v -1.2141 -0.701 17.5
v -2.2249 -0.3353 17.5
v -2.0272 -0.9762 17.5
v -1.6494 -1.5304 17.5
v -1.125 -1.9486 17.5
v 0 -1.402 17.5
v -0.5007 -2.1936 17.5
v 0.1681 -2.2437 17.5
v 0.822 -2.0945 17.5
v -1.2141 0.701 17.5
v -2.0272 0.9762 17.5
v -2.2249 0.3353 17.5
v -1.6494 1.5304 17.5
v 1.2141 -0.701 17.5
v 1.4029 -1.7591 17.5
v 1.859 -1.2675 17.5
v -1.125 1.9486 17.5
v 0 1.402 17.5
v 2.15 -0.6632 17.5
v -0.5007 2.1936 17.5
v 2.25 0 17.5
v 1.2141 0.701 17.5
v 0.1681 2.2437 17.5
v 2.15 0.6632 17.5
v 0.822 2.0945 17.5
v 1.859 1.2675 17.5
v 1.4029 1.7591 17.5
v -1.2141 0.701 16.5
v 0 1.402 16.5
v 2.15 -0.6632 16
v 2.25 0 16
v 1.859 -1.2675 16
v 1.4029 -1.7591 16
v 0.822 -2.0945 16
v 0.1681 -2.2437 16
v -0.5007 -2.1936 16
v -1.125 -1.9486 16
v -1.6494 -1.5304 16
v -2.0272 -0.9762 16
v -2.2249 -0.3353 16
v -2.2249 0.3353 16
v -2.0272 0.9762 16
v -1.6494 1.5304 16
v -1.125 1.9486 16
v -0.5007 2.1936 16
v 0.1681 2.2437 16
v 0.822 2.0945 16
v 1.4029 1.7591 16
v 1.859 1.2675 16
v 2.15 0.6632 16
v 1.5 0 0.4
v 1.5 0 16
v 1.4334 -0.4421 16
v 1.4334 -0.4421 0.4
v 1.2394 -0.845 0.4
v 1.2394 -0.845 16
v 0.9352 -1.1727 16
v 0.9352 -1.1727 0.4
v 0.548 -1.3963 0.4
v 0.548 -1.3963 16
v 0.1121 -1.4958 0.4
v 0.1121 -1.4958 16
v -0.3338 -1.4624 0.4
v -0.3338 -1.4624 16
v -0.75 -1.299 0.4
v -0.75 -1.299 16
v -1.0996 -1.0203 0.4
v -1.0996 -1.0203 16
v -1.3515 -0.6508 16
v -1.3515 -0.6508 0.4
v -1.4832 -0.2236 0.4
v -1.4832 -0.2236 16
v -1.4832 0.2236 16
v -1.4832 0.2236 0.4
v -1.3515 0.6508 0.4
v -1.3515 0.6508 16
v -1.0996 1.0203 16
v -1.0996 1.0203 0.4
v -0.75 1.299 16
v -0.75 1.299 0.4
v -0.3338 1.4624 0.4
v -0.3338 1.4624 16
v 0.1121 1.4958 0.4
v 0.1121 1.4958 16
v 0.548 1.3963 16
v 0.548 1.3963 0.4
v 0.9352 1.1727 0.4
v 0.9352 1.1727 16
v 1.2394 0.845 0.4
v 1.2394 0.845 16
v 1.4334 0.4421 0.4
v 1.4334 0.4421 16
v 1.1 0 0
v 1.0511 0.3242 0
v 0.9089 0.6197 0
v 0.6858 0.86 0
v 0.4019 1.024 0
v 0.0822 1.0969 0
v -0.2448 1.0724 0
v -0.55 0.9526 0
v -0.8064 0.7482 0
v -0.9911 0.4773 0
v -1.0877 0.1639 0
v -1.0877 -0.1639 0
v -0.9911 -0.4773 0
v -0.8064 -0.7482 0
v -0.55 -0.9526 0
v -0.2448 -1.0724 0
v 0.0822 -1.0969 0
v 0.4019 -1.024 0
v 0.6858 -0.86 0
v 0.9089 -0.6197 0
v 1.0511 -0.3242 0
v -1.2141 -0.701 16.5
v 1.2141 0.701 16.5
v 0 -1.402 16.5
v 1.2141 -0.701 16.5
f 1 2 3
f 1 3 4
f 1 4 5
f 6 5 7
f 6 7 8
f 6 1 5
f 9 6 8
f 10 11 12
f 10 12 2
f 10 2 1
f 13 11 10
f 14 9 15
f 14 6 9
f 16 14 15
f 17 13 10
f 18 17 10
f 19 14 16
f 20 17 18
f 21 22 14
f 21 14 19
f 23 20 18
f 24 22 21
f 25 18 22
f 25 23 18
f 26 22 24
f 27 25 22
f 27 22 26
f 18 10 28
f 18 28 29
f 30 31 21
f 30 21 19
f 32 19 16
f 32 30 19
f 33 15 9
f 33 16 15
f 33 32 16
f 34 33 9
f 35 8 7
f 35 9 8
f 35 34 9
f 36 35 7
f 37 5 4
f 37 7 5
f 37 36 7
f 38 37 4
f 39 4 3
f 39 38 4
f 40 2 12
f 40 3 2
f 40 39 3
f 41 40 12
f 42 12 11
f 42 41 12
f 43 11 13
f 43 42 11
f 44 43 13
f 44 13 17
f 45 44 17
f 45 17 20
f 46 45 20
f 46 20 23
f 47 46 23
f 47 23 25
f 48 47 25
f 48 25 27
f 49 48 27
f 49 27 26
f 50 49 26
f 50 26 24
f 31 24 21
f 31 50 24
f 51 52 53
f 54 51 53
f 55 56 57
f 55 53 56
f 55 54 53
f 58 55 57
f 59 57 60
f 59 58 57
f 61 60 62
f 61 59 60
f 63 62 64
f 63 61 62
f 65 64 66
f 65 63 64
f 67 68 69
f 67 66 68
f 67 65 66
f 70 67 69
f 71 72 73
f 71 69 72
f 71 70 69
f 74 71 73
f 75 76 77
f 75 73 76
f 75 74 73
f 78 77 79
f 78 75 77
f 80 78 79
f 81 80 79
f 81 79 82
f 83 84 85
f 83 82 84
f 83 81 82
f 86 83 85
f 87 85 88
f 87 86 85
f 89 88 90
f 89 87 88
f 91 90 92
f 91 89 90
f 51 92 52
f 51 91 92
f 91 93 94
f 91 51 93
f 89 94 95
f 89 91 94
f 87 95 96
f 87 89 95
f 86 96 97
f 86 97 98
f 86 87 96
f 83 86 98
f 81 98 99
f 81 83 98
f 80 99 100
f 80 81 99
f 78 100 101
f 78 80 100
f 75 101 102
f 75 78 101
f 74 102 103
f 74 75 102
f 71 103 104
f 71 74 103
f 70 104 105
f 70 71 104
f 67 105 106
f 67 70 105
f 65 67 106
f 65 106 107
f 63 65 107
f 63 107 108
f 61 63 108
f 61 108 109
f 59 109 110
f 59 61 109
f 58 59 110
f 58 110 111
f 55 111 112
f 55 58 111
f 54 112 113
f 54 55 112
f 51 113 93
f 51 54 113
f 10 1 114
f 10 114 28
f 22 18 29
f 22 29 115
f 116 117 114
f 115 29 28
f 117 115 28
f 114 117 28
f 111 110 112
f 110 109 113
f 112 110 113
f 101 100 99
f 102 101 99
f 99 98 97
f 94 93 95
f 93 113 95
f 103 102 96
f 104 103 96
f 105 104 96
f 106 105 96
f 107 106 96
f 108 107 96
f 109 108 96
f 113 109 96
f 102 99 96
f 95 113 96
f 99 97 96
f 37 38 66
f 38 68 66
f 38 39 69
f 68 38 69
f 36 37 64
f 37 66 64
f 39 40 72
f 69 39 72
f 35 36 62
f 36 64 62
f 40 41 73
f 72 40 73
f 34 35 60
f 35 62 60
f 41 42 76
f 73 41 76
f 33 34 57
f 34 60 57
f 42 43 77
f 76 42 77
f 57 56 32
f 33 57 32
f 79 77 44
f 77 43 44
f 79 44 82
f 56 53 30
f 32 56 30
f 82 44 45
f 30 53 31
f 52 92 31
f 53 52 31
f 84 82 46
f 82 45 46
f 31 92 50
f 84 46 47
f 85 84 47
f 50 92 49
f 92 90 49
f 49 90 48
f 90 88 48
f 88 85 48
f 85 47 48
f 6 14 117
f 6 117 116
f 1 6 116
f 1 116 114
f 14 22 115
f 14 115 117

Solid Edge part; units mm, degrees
sketch "Sketch1" plane through (0, 0, 0) normal (0, 0, 1) x (1, 0, 0)
  circle A0 centre (0, 0) radius 1.5
extrude "Protrusion1" add sketch "Sketch1" along normal blind 16
sketch "Sketch2" plane through (0, 0, 16) normal (0, 0, 1) x (1, 0, 0)
  circle A0 centre (0, 0) radius 2.25
extrude "ProtrusiónExtruida_2" add sketch "Sketch2" along normal blind 1.5
sketch "Sketch3" plane through (0, 0, 17.5) normal (0, 0, 1) x (1, 0, 0)
  line L0 (0, 1.402) -> (1.2141, 0.701)
  line L1 (1.2141, 0.701) -> (1.2141, -0.701)
  line L2 (1.2141, -0.701) -> (0, -1.402)
  line L3 (0, -1.402) -> (-1.2141, -0.701)
  line L4 (-1.2141, -0.701) -> (-1.2141, 0.701)
  line L5 (-1.2141, 0.701) -> (0, 1.402)
extrude "VaciadoExtruido_1" cut sketch "Sketch3" against normal blind 1
chamfer "Chaflán_1" distance 0.4 angle 45 1 edges at (-1.5, 0, 0)
properties material "Acero inoxidable, 303"
